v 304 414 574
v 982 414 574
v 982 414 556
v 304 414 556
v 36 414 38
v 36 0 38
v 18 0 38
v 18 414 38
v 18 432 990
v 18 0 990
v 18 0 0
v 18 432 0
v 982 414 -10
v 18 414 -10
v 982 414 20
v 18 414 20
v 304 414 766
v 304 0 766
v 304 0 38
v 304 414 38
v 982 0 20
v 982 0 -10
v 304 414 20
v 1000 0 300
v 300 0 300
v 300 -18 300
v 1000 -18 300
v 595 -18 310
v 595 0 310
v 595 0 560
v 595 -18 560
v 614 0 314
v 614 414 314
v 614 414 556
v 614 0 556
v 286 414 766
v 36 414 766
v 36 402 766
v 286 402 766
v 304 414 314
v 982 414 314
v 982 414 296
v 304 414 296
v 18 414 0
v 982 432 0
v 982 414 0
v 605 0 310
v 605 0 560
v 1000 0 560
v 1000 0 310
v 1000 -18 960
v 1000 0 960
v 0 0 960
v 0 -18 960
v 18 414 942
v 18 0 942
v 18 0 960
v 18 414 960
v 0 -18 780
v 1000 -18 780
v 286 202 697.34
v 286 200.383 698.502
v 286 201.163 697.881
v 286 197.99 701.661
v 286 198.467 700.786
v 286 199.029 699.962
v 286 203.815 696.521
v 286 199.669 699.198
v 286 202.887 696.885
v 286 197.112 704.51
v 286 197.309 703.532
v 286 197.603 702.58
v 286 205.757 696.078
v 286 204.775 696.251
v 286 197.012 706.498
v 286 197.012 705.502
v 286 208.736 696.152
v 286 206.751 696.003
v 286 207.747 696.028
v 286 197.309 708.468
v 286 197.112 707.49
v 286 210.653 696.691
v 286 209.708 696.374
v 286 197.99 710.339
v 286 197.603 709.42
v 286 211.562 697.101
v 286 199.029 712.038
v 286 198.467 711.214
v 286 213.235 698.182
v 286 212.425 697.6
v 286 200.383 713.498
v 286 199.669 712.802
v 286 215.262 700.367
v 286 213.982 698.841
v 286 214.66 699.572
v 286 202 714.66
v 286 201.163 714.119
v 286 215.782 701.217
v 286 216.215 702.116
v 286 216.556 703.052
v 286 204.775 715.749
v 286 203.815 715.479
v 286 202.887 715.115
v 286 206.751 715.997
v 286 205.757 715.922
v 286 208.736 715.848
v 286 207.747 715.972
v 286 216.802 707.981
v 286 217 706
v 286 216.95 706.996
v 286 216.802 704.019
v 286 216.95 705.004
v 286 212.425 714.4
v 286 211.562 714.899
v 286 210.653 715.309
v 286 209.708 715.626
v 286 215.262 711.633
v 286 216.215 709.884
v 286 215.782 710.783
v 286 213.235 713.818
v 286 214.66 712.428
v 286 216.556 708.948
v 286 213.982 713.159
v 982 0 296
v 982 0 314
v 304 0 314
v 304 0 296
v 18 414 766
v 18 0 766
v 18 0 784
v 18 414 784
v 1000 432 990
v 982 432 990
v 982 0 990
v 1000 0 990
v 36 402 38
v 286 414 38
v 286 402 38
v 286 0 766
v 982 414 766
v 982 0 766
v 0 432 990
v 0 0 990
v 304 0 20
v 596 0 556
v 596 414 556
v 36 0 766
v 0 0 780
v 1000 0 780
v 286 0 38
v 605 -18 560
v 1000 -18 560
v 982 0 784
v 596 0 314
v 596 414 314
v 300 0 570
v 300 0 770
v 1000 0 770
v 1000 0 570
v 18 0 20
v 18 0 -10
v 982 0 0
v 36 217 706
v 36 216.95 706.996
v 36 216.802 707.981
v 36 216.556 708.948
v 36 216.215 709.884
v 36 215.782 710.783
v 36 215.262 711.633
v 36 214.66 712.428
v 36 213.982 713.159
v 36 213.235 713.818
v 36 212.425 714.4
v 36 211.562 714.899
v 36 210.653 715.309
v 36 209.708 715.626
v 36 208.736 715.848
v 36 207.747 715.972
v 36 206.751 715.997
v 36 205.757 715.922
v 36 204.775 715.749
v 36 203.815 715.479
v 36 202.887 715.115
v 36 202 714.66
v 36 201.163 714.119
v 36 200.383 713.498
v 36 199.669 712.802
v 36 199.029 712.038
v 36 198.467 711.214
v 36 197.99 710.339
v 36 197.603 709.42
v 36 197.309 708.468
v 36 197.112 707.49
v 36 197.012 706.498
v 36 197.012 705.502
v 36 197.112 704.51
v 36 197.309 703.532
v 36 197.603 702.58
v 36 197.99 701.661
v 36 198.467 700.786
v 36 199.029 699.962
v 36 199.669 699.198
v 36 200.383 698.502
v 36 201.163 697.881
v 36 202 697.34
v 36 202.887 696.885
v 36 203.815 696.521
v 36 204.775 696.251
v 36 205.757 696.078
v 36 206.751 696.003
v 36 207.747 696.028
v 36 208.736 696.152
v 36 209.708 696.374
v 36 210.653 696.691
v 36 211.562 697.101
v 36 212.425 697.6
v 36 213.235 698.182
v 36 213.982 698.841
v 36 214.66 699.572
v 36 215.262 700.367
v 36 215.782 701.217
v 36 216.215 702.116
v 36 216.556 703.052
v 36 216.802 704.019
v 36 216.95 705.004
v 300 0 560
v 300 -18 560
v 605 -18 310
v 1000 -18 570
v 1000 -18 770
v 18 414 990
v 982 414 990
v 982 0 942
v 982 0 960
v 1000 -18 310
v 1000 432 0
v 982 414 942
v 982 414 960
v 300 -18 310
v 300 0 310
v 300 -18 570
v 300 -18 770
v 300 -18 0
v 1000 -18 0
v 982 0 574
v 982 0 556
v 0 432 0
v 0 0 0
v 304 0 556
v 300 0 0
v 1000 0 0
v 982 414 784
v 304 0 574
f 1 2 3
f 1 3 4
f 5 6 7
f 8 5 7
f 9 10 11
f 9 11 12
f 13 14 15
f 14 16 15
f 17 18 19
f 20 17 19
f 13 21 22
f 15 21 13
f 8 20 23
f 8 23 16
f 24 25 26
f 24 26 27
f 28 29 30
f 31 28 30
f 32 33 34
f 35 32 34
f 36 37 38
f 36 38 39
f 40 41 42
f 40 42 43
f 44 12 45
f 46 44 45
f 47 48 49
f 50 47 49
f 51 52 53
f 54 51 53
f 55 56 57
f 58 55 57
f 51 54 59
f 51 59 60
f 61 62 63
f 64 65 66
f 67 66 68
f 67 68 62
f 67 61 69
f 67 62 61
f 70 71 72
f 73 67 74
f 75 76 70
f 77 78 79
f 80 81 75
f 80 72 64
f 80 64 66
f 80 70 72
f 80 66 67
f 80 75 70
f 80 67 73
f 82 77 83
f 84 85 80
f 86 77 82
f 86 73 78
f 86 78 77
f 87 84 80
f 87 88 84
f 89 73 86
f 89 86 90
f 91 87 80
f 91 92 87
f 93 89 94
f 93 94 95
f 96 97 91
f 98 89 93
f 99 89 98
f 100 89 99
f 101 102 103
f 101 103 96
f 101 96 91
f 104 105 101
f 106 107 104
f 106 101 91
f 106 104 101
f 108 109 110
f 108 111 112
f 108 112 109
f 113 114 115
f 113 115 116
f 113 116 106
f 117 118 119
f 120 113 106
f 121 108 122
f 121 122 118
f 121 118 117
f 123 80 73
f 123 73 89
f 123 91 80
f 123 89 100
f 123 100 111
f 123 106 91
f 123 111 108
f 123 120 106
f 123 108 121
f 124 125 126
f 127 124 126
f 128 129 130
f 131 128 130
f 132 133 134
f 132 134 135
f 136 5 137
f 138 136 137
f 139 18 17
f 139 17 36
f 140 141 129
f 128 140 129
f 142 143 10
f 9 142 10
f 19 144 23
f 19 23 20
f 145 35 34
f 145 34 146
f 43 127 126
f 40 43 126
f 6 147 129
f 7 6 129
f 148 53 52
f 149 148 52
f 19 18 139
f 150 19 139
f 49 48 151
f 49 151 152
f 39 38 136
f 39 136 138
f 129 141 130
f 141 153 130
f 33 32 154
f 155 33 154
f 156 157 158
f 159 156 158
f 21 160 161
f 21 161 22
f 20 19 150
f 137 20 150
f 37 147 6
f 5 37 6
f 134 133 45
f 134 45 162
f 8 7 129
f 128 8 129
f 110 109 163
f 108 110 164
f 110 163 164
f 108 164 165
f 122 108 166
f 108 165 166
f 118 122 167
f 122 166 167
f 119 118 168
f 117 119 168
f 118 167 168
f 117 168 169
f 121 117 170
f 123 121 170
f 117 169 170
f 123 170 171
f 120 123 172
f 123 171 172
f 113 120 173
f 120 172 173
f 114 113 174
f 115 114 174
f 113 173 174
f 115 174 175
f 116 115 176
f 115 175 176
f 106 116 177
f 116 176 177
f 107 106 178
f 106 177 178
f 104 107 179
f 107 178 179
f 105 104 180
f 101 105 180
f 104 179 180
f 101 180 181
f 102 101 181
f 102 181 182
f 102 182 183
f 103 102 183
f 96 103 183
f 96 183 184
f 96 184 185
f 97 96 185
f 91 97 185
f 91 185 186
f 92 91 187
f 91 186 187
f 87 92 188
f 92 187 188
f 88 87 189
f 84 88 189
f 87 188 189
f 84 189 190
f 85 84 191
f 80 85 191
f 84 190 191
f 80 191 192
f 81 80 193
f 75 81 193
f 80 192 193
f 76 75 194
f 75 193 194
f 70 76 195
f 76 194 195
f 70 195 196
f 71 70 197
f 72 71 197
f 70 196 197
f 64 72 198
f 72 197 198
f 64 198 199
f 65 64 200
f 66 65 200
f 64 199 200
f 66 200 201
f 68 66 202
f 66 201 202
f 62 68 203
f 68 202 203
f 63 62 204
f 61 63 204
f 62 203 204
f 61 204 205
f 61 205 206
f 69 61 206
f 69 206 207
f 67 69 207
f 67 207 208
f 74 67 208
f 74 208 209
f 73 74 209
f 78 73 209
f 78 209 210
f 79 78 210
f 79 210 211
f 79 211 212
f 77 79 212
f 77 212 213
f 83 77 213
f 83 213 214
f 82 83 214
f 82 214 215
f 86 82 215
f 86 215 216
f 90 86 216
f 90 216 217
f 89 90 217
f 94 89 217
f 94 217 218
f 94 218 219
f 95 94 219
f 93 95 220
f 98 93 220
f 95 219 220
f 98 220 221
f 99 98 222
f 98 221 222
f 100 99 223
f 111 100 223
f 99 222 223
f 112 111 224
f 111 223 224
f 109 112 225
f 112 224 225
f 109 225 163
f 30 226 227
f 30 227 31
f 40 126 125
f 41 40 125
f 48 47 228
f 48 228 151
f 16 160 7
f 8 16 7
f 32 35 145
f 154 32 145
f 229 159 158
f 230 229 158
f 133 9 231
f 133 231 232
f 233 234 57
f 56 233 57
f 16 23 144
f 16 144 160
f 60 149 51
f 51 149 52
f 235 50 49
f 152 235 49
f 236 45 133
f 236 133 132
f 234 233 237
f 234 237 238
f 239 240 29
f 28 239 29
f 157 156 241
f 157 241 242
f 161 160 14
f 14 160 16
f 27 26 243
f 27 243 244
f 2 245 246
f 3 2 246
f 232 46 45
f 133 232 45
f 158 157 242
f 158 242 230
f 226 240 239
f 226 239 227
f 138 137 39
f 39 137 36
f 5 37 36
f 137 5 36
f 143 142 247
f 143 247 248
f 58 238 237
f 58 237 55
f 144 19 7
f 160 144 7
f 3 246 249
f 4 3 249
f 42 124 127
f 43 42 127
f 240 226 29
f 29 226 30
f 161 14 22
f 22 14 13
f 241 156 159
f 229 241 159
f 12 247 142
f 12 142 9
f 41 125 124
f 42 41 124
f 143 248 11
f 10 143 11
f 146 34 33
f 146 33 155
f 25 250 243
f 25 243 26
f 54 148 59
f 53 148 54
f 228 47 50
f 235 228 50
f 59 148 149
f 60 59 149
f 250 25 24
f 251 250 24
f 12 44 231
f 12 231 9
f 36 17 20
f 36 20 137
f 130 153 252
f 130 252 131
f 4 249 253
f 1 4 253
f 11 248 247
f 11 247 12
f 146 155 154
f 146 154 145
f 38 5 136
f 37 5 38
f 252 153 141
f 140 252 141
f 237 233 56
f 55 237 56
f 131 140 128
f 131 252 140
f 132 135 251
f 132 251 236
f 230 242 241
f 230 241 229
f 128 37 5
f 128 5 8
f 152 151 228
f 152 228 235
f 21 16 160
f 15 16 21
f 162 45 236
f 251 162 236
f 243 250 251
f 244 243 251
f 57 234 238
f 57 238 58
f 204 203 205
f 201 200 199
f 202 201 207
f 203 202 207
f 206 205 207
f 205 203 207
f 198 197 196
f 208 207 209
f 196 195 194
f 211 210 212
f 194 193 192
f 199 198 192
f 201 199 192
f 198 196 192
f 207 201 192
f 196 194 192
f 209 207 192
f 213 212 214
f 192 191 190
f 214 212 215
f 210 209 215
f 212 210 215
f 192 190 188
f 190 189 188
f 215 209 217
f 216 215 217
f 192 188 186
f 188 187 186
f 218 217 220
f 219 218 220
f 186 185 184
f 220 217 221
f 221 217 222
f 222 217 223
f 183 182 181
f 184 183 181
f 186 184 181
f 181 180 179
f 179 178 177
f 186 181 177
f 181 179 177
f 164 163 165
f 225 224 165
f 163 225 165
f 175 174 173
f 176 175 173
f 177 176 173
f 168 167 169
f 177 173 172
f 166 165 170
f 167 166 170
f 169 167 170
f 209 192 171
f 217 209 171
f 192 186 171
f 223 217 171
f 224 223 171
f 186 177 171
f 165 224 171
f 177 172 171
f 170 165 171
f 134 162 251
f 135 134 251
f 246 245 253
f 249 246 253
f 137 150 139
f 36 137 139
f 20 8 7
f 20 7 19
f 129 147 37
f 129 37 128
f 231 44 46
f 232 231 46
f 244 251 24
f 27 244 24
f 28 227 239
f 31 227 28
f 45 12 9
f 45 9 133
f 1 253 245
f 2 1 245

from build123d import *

# Parameters (mm, degrees)
F0_W          = 18
F0_H          = 414
F0_H_2        = 18
F1_DEPTH      = 990
F0_W_2        = 964
F2_DEPTH      = 990
F3_DEPTH      = 20
F3_DEPTH_BACK = 10
F4_W          = 982
F4_H          = 180
F4_W_2        = 18
F5_DEPTH      = 18
F4_W_3        = 700
F4_H_2        = 200
F4_W_4        = 395
F4_H_3        = 250
F4_H_4        = 300
F4_W_5        = 295
F6_W          = 964
F6_H          = 18
F7_DEPTH      = 414
F6_H_2        = 4
F6_W_2        = 18
F6_W_3        = 250
F6_H_3        = 192
F6_H_4        = 258
F6_H_5        = 242
F8_DEPTH      = 414
F9_R          = 10
F10_DEPTH     = 250
F11_W         = 250
F11_H         = 728
F12_DEPTH     = 12


# Not quite as in the source:
# - a feature names something its author has since deleted; it is built from what else it names


with BuildPart() as f1:
    # F0 (on Top) → F1 (new body)
    with BuildSketch(Plane.XY):
        with Locations((9, 207)):
            Rectangle(F0_W, F0_H)
        with Locations((9, 423)):
            Rectangle(F0_W, F0_H_2)
    extrude(amount=F1_DEPTH)


with BuildPart() as f1b:
    # F0 (on Top) → F1, piece 2 (new body)
    with BuildSketch(Plane.XY):
        with Locations((991, 423)):
            Rectangle(F0_W, F0_H_2)
        with Locations((991, 207)):
            Rectangle(F0_W, F0_H)
    extrude(amount=F1_DEPTH)


with BuildPart() as f2:
    # F0 (on Top) → F2 (new body, through all)
    with BuildSketch(Plane.XY):
        with Locations((500, 423)):
            Rectangle(F0_W_2, F0_H_2)
    extrude(amount=F2_DEPTH)


with BuildPart() as f3:
    # F0 (on Top) → F3 (new body, two sides)
    with BuildSketch(Plane.XY) as f3_sk:
        with Locations((500, 207)):
            Rectangle(F0_W_2, F0_H)
    extrude(amount=F3_DEPTH)
    extrude(f3_sk.sketch, amount=-F3_DEPTH_BACK)


with BuildPart() as f5:
    # F4 (on face) → F5 (new body)
    with BuildSketch(Plane.XZ):
        with Locations((509, 870)):
            Rectangle(F4_W, F4_H)
        with Locations((9, 870)):
            Rectangle(F4_W_2, F4_H)
    extrude(amount=F5_DEPTH)


with BuildPart() as f5b:
    # F4 (on face) → F5, piece 2 (new body)
    with BuildSketch(Plane.XZ):
        with Locations((650, 670)):
            Rectangle(F4_W_3, F4_H_2)
    extrude(amount=F5_DEPTH)


with BuildPart() as f5c:
    # F4 (on face) → F5, piece 3 (new body)
    with BuildSketch(Plane.XZ):
        with Locations((802.5, 435)):
            Rectangle(F4_W_4, F4_H_3)
    extrude(amount=F5_DEPTH)


with BuildPart() as f5d:
    # F4 (on face) → F5, piece 4 (new body)
    with BuildSketch(Plane.XZ):
        with Locations((650, 150)):
            Rectangle(F4_W_3, F4_H_4)
    extrude(amount=F5_DEPTH)


with BuildPart() as f5e:
    # F4 (on face) → F5, piece 5 (new body)
    with BuildSketch(Plane.XZ):
        with Locations((447.5, 435)):
            Rectangle(F4_W_5, F4_H_3)
    extrude(amount=F5_DEPTH)


with BuildPart() as f7:
    # F6 (on face) → F7 (new body, through all)
    with BuildSketch(Plane(origin=(0, 0, 0), x_dir=(-1, 0, 0), z_dir=(0, 1, 0))):
        with Locations((-500, 951)):
            Rectangle(F6_W, F6_H)
    extrude(amount=F7_DEPTH)


with BuildPart() as f7b:
    # F6 (on face) → F7, piece 2 (new body, through all)
    with BuildSketch(Plane(origin=(0, 0, 0), x_dir=(-1, 0, 0), z_dir=(0, 1, 0))):
        Polygon((-18, 780), (-982, 780), (-982, 766), (-304, 766), (-286, 766), (-36, 766), (-18, 766), align=None)
        with Locations((-500, 782)):
            Rectangle(F6_W, F6_H_2)
    extrude(amount=F7_DEPTH)


with BuildPart() as f7c:
    # F6 (on face) → F7, piece 3 (new body, through all)
    with BuildSketch(Plane(origin=(0, 0, 0), x_dir=(-1, 0, 0), z_dir=(0, 1, 0))):
        Polygon((-304, 556), (-304, 574), (-982, 574), (-982, 556), (-614, 556), (-596, 556), align=None)
    extrude(amount=F7_DEPTH)


with BuildPart() as f7d:
    # F6 (on face) → F7, piece 4 (new body, through all)
    with BuildSketch(Plane(origin=(0, 0, 0), x_dir=(-1, 0, 0), z_dir=(0, 1, 0))):
        Polygon((-304, 296), (-304, 314), (-596, 314), (-614, 314), (-982, 314), (-982, 296), align=None)
    extrude(amount=F7_DEPTH)


with BuildPart() as f7e:
    # F6 (on face) → F7, piece 5 (new body, through all)
    with BuildSketch(Plane(origin=(0, 0, 0), x_dir=(-1, 0, 0), z_dir=(0, 1, 0))):
        with Locations((-295, 29)):
            Rectangle(F6_W_2, F6_H)
        with Locations((-161, 29)):
            Rectangle(F6_W_3, F6_H)
        with Locations((-27, 29)):
            Rectangle(F6_W_2, F6_H)
    extrude(amount=F7_DEPTH)


with BuildPart() as f8:
    # F6 (on face) → F8 (new body, through all)
    with BuildSketch(Plane(origin=(0, 0, 0), x_dir=(-1, 0, 0), z_dir=(0, 1, 0))):
        with Locations((-295, 670)):
            Rectangle(F6_W_2, F6_H_3)
        with Locations((-295, 167)):
            Rectangle(F6_W_2, F6_H_4)
        with Locations((-295, 305)):
            Rectangle(F6_W_2, F6_H)
        with Locations((-295, 435)):
            Rectangle(F6_W_2, F6_H_5)
        with Locations((-295, 565)):
            Rectangle(F6_W_2, F6_H)
    extrude(amount=F8_DEPTH)


with BuildPart() as f8b:
    # F6 (on face) → F8, piece 2 (new body, through all)
    with BuildSketch(Plane(origin=(0, 0, 0), x_dir=(-1, 0, 0), z_dir=(0, 1, 0))):
        with Locations((-605, 435)):
            Rectangle(F6_W_2, F6_H_5)
    extrude(amount=F8_DEPTH)


with BuildPart() as f8c:
    # F6 (on face) → F8, piece 3 (new body, through all)
    with BuildSketch(Plane(origin=(0, 0, 0), x_dir=(-1, 0, 0), z_dir=(0, 1, 0))):
        with Locations((-27, 670)):
            Rectangle(F6_W_2, F6_H_3)
        with Locations((-27, 565)):
            Rectangle(F6_W_2, F6_H)
        with Locations((-27, 435)):
            Rectangle(F6_W_2, F6_H_5)
        with Locations((-27, 305)):
            Rectangle(F6_W_2, F6_H)
        with Locations((-27, 167)):
            Rectangle(F6_W_2, F6_H_4)
    extrude(amount=F8_DEPTH)


with BuildPart() as f10:
    # F9 (on face) → F10 (new body, through all)
    with BuildSketch(Plane.YZ.offset(36)):
        with Locations((207, 706)):
            Circle(F9_R)
    extrude(amount=F10_DEPTH)


with BuildPart() as f12:
    # F11 (on face) → F12 (new body)
    with BuildSketch(Plane.XZ.offset(-414)):
        with Locations((161, 402)):
            Rectangle(F11_W, F11_H)
    extrude(amount=F12_DEPTH)


solid = Compound([f1.part, f1b.part, f2.part, f3.part, f5.part, f5b.part, f5c.part, f5d.part, f5e.part, f7.part, f7b.part, f7c.part, f7d.part, f7e.part, f8.part, f8b.part, f8c.part, f10.part, f12.part])
